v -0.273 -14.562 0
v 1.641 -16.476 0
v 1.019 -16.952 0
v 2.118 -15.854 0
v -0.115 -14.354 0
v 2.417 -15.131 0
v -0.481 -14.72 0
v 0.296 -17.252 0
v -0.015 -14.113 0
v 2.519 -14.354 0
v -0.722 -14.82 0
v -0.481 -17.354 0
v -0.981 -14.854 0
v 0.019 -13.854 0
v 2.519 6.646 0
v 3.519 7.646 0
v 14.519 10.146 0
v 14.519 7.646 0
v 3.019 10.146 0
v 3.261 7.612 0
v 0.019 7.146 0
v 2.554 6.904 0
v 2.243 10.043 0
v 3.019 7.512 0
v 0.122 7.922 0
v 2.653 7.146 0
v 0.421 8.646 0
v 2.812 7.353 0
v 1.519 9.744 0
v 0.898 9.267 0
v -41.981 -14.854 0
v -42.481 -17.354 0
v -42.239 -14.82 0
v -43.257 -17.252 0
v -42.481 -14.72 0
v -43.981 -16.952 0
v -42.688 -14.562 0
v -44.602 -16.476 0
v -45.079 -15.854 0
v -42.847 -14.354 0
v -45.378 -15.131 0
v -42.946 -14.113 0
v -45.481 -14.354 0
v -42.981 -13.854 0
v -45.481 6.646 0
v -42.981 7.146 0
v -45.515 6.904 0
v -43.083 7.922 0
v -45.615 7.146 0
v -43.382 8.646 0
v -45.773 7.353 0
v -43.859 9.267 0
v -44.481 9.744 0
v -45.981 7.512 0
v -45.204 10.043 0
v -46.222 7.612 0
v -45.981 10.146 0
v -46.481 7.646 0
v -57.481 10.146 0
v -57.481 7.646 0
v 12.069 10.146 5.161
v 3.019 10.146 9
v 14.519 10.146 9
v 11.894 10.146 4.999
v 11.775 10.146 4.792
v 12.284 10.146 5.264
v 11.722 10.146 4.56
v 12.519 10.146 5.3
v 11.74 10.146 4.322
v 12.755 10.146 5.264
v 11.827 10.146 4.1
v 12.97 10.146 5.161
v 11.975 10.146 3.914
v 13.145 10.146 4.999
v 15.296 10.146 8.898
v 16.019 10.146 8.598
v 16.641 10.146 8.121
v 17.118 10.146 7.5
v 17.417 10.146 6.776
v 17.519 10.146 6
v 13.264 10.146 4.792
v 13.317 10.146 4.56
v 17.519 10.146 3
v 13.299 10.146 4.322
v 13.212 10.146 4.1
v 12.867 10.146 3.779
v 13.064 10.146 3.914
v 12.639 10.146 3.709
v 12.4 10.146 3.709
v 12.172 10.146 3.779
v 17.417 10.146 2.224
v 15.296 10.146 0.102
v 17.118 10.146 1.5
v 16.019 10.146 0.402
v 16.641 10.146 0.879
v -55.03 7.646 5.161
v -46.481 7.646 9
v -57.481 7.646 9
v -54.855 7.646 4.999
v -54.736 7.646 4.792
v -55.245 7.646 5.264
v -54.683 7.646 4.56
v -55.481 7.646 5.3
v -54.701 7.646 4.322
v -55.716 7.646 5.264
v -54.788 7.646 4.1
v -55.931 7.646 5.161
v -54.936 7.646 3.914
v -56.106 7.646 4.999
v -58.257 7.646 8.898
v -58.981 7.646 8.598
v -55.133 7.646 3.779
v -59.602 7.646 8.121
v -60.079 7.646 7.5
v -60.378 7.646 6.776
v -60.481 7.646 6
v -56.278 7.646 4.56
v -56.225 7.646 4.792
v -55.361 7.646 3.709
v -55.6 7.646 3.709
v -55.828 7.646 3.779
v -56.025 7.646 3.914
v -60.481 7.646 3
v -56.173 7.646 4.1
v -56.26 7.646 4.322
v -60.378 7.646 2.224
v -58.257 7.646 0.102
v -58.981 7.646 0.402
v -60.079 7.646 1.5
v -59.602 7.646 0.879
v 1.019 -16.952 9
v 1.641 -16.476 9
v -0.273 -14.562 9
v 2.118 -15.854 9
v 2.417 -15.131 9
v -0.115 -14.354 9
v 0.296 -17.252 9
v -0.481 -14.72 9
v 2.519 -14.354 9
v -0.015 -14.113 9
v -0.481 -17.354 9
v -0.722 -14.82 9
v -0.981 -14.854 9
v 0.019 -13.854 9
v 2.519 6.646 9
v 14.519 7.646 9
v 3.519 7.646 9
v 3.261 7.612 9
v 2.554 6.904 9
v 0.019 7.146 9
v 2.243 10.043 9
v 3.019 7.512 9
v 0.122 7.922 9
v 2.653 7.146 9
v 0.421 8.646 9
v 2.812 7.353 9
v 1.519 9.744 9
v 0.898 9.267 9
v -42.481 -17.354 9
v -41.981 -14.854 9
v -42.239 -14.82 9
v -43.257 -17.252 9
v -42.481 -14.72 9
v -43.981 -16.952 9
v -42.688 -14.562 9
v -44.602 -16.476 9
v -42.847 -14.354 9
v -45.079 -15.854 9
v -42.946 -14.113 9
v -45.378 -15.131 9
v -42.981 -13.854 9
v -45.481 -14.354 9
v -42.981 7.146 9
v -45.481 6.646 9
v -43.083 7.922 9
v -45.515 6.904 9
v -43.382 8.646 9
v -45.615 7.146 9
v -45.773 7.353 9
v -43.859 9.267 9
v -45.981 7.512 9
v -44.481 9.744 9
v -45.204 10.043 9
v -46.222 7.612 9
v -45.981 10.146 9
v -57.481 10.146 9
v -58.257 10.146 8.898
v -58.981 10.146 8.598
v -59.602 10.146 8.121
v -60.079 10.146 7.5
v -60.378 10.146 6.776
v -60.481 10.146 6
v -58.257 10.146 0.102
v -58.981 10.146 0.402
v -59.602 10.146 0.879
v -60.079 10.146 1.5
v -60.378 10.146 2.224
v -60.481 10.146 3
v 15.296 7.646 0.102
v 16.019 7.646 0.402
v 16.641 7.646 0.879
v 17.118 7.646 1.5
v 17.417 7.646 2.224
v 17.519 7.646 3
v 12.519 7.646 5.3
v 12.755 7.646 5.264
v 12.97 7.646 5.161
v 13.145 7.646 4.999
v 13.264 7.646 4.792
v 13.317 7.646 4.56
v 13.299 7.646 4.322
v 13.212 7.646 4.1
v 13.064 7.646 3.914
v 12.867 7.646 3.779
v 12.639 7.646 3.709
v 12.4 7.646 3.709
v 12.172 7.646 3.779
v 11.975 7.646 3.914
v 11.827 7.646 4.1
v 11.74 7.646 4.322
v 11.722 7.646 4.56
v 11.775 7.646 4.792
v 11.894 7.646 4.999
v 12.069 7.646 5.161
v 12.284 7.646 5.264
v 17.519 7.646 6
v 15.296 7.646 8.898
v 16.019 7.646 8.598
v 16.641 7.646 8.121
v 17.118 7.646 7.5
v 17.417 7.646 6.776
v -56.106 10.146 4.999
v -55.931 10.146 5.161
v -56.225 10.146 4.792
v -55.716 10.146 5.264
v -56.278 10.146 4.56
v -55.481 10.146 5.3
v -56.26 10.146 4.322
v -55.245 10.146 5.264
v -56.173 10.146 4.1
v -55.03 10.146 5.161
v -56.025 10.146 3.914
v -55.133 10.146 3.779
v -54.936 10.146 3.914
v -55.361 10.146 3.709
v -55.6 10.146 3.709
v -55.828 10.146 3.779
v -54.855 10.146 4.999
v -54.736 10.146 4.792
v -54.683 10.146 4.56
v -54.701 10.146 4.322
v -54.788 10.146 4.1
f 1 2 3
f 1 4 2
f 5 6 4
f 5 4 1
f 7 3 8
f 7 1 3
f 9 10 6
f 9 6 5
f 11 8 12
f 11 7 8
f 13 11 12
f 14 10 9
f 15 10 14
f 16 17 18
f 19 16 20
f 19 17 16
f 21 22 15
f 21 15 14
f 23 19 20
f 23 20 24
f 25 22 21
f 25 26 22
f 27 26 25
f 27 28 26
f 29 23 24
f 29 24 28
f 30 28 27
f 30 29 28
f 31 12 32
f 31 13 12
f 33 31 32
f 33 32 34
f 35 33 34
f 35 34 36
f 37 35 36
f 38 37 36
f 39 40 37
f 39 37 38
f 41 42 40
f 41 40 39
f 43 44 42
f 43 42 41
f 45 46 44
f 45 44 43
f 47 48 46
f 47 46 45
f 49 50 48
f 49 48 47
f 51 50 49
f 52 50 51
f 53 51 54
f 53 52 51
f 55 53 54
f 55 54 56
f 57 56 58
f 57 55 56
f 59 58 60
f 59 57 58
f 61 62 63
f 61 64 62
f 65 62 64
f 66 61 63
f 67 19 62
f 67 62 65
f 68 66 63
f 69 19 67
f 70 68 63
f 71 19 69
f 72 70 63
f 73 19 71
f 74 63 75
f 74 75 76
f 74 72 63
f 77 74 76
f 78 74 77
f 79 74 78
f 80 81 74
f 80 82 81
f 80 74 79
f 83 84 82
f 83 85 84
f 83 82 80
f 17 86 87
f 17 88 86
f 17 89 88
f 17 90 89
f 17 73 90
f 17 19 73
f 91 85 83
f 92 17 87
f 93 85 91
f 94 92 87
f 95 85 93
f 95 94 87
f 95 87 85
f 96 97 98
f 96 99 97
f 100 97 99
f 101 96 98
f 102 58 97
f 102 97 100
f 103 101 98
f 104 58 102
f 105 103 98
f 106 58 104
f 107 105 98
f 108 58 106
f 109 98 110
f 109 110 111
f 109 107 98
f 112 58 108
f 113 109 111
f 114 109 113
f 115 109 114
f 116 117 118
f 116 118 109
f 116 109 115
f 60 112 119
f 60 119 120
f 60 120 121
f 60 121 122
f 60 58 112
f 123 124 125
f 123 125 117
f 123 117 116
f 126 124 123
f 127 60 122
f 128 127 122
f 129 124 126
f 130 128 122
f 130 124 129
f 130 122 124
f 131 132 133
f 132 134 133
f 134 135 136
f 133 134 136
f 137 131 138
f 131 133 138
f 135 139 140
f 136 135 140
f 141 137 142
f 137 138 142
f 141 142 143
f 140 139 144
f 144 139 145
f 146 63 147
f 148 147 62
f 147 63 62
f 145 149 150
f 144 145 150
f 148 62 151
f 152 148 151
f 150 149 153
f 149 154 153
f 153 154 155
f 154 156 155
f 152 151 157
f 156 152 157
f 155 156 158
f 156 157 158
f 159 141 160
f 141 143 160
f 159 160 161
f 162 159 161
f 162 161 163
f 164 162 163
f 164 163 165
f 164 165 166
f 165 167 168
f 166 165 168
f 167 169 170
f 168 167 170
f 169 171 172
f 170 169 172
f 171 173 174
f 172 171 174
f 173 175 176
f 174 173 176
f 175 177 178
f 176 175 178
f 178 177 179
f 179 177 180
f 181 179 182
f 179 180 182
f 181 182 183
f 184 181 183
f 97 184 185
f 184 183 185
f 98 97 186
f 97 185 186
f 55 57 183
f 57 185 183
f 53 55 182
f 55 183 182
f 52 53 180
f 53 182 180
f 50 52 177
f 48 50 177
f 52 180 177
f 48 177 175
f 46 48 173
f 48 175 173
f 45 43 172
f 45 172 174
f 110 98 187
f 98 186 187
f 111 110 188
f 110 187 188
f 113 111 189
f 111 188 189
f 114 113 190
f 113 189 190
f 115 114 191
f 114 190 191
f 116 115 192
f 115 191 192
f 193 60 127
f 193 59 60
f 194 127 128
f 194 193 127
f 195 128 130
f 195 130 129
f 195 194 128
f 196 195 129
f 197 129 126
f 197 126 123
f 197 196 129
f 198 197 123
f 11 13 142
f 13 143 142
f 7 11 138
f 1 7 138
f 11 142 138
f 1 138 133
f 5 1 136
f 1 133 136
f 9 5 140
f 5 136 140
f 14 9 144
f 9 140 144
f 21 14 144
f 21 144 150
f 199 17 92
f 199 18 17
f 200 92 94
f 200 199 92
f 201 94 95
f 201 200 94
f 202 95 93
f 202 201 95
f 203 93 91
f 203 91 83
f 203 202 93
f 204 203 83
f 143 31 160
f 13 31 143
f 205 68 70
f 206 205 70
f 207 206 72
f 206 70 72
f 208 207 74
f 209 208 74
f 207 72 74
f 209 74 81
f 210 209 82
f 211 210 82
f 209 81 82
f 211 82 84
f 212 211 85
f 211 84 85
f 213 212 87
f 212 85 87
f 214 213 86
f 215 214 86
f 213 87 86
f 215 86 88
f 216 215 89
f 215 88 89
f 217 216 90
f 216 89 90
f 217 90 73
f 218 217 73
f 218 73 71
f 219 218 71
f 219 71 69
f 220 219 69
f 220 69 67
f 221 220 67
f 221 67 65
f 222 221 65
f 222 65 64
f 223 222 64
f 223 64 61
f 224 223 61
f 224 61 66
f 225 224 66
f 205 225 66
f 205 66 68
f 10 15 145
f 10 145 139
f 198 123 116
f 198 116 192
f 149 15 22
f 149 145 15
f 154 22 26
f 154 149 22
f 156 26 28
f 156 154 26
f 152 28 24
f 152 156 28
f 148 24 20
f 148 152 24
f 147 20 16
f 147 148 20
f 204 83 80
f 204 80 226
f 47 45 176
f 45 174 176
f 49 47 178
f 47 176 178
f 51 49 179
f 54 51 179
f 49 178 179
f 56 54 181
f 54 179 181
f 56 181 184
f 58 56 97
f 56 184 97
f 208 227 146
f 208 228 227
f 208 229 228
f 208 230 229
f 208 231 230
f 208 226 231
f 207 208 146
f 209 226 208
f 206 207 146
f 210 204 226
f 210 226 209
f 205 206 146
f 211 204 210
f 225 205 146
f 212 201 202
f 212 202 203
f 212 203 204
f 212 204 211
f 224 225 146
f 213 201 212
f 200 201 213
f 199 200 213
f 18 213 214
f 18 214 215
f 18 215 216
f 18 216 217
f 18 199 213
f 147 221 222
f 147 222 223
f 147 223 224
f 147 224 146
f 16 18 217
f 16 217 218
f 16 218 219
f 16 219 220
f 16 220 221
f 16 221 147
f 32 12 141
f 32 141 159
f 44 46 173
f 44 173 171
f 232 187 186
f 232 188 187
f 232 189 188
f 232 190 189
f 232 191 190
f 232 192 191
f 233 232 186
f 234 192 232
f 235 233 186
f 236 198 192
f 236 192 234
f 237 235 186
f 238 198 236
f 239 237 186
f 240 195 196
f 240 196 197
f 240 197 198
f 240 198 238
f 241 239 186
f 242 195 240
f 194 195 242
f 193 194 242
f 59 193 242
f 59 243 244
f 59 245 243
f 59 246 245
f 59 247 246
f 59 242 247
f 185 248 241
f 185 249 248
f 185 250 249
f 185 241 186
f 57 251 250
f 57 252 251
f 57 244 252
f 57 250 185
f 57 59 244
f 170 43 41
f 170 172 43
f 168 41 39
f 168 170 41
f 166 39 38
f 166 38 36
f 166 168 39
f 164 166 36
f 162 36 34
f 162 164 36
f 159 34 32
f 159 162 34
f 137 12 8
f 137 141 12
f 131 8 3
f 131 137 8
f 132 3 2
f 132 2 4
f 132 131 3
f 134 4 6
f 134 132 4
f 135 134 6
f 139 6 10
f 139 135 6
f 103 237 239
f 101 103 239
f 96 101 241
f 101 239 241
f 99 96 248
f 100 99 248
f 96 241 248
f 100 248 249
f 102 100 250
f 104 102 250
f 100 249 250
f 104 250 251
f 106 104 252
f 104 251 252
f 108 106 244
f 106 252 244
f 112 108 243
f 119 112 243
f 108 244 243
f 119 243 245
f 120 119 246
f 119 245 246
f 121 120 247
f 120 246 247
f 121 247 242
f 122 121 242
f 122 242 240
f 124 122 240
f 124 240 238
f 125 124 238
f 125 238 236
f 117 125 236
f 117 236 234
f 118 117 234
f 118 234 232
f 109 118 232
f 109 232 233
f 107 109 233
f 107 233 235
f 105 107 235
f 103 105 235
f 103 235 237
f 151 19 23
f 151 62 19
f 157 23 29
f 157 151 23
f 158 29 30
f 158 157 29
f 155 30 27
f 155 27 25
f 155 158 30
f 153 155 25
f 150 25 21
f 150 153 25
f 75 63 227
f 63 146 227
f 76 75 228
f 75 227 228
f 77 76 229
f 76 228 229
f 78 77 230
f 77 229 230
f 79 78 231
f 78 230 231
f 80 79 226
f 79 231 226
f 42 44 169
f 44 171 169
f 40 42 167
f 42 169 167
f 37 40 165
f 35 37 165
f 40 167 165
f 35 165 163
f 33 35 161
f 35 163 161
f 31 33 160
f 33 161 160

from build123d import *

# Parameters (mm, degrees)
BOSS_EXTRUDE1_DEPTH = 9
SKETCH2_R           = 0.8
CUT_EXTRUDE1_DEPTH  = 9
FILLET1_R           = 1
FILLET2_R           = 3
FILLET3_R           = 3


with BuildPart() as part:
    # Sketch1 → Boss-Extrude1 (new body)
    with BuildSketch(Plane.XY):
        Polygon((-45.480536292, -17.354415164), (-45.480536292, 7.645584836), (-60.480536292, 7.645584836), (-60.480536292, 10.145584836), (-42.980536292, 10.145584836), (-42.980536292, -14.854415164), (0.019463708, -14.854415164), (0.019463708, 10.145584836), (17.519463708, 10.145584836), (17.519463708, 7.645584836), (2.519463708, 7.645584836), (2.519463708, -17.354415164), align=None)
    extrude(amount=BOSS_EXTRUDE1_DEPTH)

    # Sketch2 → Cut-Extrude1 (cut)
    with BuildSketch(Plane(origin=(0, 10.145584836, 0), x_dir=(1, 0, 0), z_dir=(0, 1, 0))):
        with Locations(Location((-55.480536292, -4.5, 0), (0, 0, 270))):
            Circle(SKETCH2_R)
        with Locations(Location((12.519463708, -4.5, 0), (0, 0, 270))):
            Circle(SKETCH2_R)
    extrude(amount=-CUT_EXTRUDE1_DEPTH, mode=Mode.SUBTRACT)

    # Fillet1
    fillet1_edges = [part.edges().sort_by_distance(p)[0] for p in [
        (-45.480536292, 7.645584836, 4.5),
        (-42.980536292, -14.854415164, 4.5),
        (0.019463708, -14.854415164, 4.5),
        (2.519463708, 7.645584836, 4.5),
    ]]
    fillet(fillet1_edges, radius=FILLET1_R)

    # Fillet2
    fillet2_edges = [part.edges().sort_by_distance(p)[0] for p in [
        (-45.480536292, -17.354415164, 4.5),
        (-42.980536292, 10.145584836, 4.5),
        (0.019463708, 10.145584836, 4.5),
        (2.519463708, -17.354415164, 4.5),
    ]]
    fillet(fillet2_edges, radius=FILLET2_R)

    # Fillet3
    fillet3_edges = [part.edges().sort_by_distance(p)[0] for p in [
        (-60.480536292, 8.895584836, 0),
        (17.519463708, 8.895584836, 0),
        (17.519463708, 8.895584836, 9),
        (-60.480536292, 8.895584836, 9),
    ]]
    fillet(fillet3_edges, radius=FILLET3_R)


solid = part.part
